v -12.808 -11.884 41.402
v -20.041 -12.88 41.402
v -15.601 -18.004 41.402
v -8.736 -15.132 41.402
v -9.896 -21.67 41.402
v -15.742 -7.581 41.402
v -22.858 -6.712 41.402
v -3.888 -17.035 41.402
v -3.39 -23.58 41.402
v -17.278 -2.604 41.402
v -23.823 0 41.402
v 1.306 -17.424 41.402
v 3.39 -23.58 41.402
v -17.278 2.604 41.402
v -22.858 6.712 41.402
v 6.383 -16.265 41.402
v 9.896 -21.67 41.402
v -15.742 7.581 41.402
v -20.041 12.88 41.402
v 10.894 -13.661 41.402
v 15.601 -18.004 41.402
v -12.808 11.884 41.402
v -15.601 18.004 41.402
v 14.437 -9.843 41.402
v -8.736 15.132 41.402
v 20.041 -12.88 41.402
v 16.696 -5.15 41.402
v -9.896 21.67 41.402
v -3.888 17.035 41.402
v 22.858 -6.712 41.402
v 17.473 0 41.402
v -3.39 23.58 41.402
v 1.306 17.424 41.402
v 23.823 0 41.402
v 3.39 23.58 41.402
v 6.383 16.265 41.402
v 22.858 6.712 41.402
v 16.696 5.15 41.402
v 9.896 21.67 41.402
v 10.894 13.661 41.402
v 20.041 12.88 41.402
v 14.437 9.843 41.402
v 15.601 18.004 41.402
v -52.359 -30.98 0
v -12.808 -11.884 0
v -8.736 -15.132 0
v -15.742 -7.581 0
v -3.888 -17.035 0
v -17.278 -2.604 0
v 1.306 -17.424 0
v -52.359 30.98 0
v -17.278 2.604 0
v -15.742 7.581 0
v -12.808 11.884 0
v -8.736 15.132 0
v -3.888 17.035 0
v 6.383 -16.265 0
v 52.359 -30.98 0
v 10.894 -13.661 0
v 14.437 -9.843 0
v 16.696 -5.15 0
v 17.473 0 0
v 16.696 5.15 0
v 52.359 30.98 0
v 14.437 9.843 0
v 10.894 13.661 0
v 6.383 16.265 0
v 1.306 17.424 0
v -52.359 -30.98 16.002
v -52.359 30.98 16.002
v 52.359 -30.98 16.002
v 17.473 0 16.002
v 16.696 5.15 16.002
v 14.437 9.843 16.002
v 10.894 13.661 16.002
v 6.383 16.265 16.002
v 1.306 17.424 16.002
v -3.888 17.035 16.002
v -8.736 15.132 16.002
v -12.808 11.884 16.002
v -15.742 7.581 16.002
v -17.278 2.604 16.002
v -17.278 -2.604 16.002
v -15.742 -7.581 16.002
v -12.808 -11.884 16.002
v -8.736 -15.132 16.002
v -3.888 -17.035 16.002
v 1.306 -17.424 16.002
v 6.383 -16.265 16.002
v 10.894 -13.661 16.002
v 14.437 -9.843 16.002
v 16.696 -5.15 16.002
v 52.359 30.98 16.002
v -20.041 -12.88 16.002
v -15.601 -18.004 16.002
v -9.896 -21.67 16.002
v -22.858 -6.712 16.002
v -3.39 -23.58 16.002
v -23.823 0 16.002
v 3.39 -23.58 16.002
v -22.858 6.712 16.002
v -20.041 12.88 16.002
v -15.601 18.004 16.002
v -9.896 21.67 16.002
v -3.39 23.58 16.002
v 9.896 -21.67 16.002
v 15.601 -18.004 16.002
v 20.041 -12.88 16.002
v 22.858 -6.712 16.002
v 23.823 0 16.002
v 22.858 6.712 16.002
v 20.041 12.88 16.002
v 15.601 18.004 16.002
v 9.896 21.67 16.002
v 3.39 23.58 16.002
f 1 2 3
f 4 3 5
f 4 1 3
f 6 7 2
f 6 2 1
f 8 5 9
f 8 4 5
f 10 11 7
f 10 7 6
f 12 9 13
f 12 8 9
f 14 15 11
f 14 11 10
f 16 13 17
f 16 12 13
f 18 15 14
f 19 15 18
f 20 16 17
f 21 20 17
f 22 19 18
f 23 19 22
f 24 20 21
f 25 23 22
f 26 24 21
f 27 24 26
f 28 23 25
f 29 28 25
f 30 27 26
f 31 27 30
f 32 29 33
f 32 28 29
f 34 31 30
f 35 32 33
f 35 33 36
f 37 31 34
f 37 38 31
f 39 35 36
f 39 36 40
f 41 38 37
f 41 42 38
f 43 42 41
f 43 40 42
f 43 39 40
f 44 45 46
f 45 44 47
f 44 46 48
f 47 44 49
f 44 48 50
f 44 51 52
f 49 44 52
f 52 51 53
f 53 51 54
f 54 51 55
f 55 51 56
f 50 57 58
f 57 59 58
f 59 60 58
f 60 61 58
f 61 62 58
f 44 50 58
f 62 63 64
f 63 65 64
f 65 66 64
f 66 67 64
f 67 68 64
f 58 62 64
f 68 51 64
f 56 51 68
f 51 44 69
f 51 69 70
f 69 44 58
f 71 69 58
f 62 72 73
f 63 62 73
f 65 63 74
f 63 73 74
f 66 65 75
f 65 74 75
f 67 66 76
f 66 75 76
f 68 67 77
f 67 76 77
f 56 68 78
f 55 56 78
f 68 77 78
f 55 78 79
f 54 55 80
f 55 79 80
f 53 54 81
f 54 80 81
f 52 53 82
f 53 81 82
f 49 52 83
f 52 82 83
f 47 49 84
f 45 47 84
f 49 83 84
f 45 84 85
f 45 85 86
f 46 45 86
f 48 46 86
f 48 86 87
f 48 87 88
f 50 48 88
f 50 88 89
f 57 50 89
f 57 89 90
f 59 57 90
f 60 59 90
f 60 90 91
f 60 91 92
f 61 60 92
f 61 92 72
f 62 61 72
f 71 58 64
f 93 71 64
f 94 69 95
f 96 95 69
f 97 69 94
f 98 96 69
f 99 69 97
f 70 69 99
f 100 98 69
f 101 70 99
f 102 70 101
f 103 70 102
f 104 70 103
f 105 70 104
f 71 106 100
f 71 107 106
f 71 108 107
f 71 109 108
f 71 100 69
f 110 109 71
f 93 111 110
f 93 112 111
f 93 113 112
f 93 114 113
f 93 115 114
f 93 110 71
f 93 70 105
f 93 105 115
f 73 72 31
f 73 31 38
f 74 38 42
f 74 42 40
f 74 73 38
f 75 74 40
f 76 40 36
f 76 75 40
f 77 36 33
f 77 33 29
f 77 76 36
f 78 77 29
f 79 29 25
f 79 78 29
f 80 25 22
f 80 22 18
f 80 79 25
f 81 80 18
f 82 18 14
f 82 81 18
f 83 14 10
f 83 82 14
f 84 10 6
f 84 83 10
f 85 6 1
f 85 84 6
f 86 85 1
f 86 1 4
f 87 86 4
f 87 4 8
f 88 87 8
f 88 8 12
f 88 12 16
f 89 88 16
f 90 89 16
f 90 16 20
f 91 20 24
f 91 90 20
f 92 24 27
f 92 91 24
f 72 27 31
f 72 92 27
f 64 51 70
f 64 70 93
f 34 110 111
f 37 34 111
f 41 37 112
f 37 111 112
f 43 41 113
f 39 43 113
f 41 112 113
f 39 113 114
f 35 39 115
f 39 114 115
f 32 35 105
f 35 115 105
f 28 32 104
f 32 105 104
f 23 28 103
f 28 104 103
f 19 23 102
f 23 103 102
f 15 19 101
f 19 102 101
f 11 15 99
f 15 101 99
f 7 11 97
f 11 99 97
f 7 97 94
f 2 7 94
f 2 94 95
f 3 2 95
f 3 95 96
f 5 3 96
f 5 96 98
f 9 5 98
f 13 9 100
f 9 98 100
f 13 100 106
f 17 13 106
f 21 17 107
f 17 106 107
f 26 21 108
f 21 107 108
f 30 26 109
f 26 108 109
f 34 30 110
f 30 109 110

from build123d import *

# Parameters (mm, degrees)
F0_W      = 104.71709
F0_H      = 61.959744
F1_DEPTH  = 16.002
F2_R      = 23.822659
F2_R_2    = 17.472659
F3_DEPTH  = 25.4
F3_FACE_R = 17.472659
F4_DEPTH  = 25.4


with BuildPart() as f1:
    # F0 (on Top) → F1 (new body)
    with BuildSketch(Plane.XY):
        Rectangle(F0_W, F0_H)
    extrude(amount=F1_DEPTH)

    # F2 (on face) → F3 (join)
    with BuildSketch(Plane.XY.offset(16.002)):
        Circle(F2_R)
        Circle(F2_R_2, mode=Mode.SUBTRACT)
    extrude(amount=F3_DEPTH)

    # F3_face (on face) → F4 (cut)
    with BuildSketch(Plane.XY.offset(16.002)):
        Circle(F3_FACE_R)
    extrude(amount=-F4_DEPTH, mode=Mode.SUBTRACT)


solid = f1.part
